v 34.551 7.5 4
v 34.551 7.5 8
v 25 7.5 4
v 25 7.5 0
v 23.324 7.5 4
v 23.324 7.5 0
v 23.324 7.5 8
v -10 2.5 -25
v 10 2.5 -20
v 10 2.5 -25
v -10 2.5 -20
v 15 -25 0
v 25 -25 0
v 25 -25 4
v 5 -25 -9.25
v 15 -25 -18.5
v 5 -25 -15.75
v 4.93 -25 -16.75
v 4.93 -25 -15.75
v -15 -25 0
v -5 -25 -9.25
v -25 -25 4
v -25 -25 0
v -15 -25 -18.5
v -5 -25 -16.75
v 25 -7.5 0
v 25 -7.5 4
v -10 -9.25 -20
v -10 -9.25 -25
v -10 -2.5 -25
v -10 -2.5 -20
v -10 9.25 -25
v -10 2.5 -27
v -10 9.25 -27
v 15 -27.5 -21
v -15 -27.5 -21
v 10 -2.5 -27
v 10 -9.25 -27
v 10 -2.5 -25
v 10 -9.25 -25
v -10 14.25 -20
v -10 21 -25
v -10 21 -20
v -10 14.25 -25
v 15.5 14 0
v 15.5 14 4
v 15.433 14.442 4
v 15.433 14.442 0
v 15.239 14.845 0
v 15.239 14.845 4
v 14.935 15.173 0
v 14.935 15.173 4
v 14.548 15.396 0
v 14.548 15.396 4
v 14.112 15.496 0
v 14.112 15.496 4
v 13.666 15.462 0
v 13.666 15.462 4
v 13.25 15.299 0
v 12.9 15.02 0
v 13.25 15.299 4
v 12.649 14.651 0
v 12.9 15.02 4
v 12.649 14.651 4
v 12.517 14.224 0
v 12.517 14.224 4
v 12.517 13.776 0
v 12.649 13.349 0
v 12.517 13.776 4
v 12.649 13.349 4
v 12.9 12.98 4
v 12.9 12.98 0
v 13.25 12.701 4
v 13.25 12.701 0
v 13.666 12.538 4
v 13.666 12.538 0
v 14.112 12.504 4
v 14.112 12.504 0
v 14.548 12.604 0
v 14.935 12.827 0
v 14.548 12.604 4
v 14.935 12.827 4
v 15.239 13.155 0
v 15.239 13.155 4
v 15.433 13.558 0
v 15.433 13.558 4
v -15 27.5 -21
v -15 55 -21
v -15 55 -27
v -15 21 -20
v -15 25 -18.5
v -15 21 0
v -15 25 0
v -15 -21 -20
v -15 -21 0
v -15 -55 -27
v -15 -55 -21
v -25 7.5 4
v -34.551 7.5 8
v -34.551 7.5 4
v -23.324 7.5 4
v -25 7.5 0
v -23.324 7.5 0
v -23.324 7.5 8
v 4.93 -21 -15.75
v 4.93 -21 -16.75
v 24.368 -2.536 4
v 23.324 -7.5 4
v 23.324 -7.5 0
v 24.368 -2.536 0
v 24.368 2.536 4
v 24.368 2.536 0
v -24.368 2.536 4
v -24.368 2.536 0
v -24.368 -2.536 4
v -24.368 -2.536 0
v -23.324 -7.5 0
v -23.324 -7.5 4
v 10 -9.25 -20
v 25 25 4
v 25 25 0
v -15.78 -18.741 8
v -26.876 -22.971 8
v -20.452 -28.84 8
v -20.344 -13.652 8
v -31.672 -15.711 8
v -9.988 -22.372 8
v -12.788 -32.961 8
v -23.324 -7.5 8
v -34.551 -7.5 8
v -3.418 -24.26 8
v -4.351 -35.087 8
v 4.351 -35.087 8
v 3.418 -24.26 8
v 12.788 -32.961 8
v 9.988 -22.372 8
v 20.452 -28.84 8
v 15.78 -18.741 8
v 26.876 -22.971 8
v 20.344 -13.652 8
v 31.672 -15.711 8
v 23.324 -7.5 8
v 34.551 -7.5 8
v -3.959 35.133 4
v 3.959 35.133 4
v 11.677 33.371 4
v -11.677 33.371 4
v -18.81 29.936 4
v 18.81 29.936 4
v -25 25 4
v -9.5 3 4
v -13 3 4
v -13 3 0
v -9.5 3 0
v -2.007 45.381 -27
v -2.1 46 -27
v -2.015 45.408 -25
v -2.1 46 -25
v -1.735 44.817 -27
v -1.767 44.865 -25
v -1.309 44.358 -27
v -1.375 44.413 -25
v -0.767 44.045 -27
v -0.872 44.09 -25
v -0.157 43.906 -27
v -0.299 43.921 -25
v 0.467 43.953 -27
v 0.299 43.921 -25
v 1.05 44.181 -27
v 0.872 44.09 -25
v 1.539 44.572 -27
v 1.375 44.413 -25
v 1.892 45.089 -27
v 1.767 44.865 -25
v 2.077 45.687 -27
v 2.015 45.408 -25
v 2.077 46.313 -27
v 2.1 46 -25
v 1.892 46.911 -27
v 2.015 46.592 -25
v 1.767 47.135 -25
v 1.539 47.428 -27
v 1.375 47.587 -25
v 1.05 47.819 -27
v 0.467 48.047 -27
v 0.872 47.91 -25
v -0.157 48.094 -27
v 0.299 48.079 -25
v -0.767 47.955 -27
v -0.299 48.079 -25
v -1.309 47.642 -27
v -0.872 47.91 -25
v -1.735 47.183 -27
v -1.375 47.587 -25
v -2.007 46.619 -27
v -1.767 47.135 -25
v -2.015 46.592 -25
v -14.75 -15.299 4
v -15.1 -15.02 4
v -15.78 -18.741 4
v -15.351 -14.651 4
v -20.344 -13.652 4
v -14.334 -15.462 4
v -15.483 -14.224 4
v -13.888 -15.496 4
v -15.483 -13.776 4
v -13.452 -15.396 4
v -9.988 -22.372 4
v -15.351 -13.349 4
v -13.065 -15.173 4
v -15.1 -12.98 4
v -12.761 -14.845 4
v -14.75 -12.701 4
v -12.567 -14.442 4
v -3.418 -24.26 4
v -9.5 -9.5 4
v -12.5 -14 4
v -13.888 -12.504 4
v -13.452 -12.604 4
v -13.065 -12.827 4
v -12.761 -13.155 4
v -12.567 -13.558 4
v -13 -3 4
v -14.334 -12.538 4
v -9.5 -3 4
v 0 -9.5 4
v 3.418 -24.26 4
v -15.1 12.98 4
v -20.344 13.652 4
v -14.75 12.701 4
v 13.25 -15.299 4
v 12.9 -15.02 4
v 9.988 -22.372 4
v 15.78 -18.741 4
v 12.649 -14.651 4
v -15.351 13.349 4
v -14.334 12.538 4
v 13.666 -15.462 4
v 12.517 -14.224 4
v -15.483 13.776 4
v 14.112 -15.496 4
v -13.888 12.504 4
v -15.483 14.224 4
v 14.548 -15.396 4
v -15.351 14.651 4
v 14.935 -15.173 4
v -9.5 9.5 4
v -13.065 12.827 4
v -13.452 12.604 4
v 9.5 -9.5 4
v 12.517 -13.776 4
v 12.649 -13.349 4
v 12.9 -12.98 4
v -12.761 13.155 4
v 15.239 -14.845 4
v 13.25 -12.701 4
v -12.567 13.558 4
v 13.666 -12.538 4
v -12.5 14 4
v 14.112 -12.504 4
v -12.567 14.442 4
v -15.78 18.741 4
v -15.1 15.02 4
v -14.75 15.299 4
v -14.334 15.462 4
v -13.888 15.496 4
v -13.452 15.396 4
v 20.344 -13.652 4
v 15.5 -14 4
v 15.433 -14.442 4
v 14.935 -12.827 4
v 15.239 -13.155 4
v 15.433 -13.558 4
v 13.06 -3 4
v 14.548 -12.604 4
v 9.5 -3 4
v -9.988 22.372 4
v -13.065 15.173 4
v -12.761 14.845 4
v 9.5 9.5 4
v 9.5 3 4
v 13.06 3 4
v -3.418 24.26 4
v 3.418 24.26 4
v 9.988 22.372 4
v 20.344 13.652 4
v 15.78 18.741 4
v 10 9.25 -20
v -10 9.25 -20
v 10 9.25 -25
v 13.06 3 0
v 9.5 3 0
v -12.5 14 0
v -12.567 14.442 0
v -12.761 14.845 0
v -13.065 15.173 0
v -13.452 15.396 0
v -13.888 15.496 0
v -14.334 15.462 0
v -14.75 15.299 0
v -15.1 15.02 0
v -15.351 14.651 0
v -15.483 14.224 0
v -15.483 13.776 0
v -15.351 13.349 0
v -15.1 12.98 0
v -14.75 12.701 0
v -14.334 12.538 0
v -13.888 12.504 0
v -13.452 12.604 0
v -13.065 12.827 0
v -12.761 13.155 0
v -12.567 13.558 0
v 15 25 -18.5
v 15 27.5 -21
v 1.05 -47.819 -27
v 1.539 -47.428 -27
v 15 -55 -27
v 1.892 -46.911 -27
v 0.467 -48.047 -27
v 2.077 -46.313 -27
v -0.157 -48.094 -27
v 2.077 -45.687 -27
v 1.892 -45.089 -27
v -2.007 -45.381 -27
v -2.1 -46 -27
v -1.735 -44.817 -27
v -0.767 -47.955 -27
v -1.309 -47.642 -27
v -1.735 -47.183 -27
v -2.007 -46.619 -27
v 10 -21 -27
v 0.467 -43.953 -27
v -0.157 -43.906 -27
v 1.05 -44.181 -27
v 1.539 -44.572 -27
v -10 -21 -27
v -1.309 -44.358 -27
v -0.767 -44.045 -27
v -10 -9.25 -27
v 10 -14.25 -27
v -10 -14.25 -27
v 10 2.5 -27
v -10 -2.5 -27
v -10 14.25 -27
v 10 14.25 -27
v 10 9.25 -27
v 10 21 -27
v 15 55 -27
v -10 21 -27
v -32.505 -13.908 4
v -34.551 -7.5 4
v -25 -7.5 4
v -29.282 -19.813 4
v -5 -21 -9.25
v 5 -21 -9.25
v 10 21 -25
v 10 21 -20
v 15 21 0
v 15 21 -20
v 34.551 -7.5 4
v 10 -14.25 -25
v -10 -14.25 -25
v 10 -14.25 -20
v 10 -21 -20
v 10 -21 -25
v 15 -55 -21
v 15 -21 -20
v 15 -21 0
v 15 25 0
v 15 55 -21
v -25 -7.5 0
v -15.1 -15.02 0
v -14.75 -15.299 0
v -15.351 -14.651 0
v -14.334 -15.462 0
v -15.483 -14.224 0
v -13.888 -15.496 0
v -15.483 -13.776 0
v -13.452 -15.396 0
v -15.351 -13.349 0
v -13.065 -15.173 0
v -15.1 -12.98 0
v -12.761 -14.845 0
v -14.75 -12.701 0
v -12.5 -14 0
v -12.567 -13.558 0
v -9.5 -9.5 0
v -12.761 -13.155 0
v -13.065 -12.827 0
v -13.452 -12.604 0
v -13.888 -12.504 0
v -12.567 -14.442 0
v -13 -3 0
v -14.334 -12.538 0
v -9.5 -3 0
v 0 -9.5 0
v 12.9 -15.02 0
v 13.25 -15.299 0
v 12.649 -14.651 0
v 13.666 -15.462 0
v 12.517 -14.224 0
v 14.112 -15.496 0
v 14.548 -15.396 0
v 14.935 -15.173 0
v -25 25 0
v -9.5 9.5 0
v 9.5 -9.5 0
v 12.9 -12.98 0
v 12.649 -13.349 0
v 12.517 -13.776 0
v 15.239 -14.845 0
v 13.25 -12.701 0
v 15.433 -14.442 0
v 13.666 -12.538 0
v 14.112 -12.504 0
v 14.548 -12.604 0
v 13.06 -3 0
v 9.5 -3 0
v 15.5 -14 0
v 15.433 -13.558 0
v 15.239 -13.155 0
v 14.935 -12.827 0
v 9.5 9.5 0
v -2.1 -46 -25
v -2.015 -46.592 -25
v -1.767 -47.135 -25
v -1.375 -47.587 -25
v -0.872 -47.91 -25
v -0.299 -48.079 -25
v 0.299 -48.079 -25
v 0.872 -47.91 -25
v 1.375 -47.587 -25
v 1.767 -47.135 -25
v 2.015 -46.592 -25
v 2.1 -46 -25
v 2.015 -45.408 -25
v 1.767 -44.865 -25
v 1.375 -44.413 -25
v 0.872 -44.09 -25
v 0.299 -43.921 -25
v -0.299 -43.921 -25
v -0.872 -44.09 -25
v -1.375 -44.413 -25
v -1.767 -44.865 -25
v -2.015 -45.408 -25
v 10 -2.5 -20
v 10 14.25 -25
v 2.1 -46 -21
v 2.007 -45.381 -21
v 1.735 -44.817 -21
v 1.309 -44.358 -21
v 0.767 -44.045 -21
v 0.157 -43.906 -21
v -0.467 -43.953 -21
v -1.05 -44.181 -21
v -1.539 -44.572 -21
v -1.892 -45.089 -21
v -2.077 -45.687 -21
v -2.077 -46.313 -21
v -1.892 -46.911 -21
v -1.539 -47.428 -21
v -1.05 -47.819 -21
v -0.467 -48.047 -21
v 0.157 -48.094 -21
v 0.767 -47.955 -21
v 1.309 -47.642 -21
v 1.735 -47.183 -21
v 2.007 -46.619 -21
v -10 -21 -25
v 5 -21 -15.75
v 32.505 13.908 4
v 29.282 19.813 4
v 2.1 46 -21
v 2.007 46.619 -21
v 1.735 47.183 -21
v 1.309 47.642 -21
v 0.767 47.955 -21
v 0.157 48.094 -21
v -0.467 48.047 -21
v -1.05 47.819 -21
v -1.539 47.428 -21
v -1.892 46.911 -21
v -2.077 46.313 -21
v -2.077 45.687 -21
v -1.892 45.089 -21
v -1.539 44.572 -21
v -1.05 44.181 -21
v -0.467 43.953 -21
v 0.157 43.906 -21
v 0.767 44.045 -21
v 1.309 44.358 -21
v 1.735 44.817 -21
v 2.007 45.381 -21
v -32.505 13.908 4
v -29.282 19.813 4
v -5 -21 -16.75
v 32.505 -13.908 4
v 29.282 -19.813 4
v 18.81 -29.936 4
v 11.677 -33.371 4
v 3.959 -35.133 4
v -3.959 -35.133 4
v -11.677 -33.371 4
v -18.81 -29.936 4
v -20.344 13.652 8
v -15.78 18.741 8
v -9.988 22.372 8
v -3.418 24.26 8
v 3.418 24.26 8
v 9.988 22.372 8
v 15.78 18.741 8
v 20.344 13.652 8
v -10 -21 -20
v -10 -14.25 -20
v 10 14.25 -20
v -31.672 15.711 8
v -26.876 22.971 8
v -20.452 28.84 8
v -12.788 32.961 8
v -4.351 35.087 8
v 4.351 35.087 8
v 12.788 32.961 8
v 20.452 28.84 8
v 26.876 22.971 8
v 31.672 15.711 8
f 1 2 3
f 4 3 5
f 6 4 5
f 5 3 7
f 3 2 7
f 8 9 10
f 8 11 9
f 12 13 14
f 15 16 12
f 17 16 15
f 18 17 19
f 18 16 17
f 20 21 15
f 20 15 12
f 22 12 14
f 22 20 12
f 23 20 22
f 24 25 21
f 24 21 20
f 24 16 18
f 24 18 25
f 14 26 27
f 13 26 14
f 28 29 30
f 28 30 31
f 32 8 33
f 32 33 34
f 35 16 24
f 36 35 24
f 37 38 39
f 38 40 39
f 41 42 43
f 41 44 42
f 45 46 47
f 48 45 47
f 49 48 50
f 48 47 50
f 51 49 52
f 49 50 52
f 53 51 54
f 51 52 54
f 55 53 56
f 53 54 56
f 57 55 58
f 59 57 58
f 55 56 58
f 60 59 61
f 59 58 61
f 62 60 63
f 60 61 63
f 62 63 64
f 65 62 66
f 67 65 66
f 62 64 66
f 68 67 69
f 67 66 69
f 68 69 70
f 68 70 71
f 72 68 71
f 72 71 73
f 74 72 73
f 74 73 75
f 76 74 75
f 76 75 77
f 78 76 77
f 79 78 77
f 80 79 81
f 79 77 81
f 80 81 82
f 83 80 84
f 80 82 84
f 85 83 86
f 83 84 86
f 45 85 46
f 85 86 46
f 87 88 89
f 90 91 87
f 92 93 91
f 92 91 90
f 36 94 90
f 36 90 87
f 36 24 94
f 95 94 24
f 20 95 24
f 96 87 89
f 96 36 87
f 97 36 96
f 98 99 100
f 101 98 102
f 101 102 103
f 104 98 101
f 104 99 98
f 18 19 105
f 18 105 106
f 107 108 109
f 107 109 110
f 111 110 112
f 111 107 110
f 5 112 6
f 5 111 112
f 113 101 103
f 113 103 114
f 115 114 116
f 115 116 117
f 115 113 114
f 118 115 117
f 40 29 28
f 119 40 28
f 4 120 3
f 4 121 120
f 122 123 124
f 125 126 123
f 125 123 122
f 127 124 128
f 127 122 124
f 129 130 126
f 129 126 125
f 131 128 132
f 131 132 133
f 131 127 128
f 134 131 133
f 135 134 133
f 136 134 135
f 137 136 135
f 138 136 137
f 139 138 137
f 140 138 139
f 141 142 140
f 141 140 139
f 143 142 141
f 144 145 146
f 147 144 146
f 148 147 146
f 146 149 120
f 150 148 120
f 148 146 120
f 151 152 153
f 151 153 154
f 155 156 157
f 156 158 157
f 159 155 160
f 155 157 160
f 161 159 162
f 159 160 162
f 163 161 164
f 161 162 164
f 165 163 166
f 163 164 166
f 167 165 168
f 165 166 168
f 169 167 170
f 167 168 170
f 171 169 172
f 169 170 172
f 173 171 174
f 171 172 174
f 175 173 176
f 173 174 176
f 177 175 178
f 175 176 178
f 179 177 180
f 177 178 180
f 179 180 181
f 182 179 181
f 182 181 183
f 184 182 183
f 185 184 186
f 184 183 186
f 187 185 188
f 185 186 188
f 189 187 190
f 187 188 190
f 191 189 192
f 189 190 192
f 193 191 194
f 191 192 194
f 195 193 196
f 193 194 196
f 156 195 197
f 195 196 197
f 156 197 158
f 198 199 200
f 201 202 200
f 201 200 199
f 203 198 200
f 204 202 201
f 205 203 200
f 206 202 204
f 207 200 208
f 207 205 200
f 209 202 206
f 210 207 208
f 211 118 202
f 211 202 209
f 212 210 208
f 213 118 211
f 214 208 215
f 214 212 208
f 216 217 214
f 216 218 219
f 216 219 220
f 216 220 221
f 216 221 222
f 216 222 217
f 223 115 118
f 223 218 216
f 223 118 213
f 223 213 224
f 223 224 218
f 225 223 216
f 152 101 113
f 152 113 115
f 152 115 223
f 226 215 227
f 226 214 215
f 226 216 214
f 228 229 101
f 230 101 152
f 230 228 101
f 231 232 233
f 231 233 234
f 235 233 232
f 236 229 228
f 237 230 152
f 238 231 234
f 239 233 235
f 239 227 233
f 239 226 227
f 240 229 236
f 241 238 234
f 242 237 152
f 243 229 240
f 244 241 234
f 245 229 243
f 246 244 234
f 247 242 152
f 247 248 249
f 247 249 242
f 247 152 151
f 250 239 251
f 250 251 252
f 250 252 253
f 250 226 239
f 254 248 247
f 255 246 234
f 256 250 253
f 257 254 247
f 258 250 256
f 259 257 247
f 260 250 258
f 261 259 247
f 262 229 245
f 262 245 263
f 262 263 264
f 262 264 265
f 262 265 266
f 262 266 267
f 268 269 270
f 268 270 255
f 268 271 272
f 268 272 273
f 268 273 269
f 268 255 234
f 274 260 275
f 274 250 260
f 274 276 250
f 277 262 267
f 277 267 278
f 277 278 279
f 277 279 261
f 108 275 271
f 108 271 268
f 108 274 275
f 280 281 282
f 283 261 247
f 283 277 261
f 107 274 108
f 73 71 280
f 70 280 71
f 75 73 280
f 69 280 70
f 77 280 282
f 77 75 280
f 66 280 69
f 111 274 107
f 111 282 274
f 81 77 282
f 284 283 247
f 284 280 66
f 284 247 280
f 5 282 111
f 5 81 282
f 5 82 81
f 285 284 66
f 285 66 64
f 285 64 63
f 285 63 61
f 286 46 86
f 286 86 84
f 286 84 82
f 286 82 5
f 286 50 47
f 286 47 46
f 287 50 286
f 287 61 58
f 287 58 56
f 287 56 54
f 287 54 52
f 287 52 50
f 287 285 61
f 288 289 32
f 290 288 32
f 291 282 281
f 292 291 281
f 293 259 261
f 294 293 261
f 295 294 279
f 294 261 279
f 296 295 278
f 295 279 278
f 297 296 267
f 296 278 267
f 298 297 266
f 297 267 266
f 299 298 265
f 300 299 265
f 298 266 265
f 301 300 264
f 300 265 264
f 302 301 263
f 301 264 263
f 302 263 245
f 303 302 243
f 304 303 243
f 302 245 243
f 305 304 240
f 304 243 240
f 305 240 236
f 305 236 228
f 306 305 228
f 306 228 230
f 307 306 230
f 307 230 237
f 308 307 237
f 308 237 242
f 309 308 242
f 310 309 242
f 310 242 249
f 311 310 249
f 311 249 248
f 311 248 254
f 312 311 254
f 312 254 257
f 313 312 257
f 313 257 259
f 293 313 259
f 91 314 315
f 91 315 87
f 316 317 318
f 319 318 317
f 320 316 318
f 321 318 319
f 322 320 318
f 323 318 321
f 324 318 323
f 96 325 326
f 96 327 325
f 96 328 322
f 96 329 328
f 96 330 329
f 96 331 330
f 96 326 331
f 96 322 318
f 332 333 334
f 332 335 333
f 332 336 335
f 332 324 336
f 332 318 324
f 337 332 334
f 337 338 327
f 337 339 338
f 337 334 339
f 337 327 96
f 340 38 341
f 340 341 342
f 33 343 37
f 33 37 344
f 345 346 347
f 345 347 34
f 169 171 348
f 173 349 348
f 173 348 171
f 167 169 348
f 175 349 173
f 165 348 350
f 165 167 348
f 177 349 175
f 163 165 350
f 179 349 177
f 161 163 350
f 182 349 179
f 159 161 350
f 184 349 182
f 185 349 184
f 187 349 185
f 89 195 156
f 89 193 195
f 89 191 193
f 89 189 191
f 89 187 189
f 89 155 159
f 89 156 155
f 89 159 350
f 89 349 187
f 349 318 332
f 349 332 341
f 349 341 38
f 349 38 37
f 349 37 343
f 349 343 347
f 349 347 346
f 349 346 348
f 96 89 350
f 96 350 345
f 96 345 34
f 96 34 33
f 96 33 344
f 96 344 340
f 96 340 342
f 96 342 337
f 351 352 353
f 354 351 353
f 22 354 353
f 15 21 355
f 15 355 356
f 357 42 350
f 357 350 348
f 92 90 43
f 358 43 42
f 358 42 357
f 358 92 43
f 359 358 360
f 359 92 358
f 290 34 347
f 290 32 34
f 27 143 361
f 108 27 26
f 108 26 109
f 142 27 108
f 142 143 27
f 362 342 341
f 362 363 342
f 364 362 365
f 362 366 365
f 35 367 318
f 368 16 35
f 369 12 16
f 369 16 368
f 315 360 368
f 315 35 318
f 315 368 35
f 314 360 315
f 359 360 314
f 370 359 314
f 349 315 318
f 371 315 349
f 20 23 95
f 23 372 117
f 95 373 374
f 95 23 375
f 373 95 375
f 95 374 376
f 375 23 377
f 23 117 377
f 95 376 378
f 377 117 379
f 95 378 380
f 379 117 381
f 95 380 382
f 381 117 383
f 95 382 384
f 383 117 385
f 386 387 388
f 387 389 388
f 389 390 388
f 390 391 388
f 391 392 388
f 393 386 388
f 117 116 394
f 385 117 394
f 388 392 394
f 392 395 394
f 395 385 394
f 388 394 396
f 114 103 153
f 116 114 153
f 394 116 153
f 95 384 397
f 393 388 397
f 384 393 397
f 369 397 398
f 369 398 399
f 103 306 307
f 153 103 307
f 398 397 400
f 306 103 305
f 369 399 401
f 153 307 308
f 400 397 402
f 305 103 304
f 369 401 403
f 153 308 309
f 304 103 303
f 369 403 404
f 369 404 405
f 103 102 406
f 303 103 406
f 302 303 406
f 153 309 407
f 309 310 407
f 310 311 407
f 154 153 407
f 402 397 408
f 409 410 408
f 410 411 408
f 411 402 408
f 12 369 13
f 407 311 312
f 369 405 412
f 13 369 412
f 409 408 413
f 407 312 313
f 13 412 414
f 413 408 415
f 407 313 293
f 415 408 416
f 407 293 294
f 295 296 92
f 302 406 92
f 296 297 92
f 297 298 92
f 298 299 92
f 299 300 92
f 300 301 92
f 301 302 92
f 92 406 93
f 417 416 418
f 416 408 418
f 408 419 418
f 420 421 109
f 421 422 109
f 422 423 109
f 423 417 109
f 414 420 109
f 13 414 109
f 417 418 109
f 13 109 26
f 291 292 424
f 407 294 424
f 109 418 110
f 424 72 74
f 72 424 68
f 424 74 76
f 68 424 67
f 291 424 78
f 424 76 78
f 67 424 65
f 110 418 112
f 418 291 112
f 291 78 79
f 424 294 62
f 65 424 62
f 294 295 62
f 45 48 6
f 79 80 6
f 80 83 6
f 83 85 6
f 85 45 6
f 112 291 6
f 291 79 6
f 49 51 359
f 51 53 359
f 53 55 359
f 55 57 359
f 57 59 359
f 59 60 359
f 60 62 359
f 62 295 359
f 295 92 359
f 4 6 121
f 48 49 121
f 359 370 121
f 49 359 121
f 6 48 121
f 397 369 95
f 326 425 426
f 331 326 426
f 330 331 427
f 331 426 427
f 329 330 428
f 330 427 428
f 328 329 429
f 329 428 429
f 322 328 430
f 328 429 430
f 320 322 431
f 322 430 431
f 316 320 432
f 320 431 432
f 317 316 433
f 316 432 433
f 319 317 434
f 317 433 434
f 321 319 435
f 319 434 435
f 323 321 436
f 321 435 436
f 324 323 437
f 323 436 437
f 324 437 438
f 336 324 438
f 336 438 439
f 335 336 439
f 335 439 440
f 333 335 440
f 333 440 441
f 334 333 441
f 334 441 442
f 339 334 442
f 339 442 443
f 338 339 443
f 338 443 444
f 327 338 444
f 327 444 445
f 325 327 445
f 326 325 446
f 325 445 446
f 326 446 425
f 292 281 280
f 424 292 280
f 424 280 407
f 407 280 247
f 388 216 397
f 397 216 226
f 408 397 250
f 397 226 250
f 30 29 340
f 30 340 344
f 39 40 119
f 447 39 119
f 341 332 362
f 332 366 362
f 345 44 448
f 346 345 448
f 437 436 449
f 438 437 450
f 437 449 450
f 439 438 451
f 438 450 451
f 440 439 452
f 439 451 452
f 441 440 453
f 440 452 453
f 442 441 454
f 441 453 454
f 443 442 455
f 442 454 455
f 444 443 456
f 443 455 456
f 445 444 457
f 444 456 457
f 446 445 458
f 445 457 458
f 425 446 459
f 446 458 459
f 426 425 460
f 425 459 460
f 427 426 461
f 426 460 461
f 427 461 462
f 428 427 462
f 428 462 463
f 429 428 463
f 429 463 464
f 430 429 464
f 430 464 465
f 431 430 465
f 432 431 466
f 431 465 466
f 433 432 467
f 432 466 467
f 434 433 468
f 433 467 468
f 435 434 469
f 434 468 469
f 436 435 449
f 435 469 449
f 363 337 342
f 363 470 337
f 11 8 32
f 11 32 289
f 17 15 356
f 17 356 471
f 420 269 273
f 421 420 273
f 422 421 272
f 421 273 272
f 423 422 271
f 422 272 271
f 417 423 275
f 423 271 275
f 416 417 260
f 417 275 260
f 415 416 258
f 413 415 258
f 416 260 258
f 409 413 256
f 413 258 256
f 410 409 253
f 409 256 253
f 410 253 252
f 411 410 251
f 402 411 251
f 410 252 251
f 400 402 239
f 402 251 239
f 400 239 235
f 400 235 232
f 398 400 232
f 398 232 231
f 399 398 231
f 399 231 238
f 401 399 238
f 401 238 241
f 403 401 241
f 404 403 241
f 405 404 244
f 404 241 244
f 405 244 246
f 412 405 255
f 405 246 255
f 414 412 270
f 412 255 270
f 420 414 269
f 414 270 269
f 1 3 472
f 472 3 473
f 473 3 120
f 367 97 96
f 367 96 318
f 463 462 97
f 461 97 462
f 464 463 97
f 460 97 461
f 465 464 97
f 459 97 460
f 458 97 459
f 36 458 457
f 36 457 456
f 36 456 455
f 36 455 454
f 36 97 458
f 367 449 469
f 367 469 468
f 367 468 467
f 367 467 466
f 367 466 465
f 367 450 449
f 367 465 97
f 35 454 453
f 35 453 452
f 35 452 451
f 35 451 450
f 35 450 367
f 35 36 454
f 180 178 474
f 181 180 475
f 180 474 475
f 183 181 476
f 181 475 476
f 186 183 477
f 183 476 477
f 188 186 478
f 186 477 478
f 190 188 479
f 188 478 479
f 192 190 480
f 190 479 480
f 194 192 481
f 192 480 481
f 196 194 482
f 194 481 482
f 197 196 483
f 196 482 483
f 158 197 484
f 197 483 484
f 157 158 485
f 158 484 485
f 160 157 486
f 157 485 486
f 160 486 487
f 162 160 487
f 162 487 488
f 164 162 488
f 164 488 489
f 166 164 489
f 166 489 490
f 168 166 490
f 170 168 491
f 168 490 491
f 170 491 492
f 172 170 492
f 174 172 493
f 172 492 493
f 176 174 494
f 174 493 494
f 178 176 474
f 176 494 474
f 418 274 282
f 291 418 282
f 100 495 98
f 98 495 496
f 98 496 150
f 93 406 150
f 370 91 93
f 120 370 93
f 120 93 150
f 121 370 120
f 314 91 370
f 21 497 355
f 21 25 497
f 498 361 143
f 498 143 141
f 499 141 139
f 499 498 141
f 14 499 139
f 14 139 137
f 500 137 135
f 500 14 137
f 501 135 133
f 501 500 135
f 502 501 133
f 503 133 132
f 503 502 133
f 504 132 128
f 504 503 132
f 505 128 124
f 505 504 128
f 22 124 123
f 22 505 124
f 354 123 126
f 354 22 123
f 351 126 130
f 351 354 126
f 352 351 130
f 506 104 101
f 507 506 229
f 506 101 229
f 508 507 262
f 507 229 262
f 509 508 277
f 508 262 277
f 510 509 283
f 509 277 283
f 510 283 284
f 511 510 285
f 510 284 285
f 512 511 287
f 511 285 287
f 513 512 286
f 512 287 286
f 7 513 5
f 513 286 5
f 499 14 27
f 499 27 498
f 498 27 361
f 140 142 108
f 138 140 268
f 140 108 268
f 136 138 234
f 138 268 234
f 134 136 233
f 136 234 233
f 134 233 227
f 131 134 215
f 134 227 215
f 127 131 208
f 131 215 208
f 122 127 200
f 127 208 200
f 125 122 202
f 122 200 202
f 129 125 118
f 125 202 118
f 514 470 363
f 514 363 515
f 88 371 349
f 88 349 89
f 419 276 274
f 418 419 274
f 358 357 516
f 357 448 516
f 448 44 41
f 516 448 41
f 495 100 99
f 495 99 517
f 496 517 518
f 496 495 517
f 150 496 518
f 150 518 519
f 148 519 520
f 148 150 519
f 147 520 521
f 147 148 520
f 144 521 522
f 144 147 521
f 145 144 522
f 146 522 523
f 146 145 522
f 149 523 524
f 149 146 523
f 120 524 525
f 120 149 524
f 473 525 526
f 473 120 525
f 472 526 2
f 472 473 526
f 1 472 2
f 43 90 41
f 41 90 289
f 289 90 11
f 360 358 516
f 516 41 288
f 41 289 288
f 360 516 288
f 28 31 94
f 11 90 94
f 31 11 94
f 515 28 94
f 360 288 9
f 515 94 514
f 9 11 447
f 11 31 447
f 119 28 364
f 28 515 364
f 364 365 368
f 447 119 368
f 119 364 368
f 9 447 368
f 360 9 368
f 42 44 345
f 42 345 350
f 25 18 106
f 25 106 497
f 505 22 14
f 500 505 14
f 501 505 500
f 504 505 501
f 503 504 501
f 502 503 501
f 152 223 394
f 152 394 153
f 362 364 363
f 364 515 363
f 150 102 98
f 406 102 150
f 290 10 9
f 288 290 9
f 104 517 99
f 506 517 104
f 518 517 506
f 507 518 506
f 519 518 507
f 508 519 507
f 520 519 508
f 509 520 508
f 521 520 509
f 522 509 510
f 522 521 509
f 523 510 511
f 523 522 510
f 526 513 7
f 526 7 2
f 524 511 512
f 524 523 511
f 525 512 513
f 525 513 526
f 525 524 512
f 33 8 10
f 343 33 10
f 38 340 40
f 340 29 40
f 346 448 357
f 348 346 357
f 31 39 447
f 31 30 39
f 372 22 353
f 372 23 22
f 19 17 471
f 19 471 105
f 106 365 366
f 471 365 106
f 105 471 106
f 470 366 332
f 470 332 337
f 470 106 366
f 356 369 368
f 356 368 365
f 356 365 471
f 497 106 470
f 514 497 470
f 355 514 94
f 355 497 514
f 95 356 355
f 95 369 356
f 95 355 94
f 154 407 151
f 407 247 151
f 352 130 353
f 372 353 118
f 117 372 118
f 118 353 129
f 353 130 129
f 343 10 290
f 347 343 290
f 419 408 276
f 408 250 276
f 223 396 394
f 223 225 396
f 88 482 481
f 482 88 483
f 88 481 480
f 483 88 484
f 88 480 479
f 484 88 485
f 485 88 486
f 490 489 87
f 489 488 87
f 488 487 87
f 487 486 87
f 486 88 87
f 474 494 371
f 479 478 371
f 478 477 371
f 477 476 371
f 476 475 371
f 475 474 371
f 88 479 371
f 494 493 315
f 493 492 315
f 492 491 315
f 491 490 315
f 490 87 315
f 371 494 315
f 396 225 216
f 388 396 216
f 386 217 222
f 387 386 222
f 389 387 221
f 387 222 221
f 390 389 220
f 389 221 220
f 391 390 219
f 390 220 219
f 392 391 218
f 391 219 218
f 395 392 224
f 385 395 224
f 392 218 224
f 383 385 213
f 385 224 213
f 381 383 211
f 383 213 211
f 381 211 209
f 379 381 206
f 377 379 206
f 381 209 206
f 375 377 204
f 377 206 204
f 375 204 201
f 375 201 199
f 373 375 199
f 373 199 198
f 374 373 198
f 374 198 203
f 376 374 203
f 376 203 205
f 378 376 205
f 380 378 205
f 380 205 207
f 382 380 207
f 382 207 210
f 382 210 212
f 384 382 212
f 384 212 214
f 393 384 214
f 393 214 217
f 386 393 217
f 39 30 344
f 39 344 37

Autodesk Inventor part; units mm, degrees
ref_plane "YZ Plane" through (0, 0, 0) normal (1, 0, 0) x (0, 1, 0)
ref_plane "XZ Plane" through (0, 0, 0) normal (0, 1, 0) x (-1, 0, 0)
ref_plane "XY Plane" through (0, 0, 0) normal (0, 0, 1) x (1, 0, 0)
ref_plane "Arbeitsebene2" through (0, 0, 0) normal (0, 0, 1) x (1, 0, 0)
ref_plane "Arbeitsebene1" through (0, 0, -5) normal (0, 0, 1) x (1, 0, 0)
sketch "Skizze2" plane through (0, 0, 0) normal (0, 0, 1) x (1, 0, 0)
  line L0 (13.6, 12.5) -> (15, 12.5) projected
  arc A0 (10.4, 12.5) -> (13.6, 12.5) centre (12, 12.5) ccw projected
  line L1 (-10.4, 12.5) -> (10.4, 12.5) projected
  arc A1 (-13.6, 12.5) -> (-10.4, 12.5) centre (-12, 12.5) ccw projected
  line L2 (-15, 12.5) -> (-13.6, 12.5) projected
  line L3 (-15, 12.5) -> (-15, -12.5) projected
  line L4 (-15, -12.5) -> (-13.6, -12.5) projected
  arc A2 (-10.4, -12.5) -> (-13.6, -12.5) centre (-12, -12.5) ccw projected
  line L5 (-10.4, -12.5) -> (10.4, -12.5) projected
  arc A3 (13.6, -12.5) -> (10.4, -12.5) centre (12, -12.5) ccw projected
  line L6 (13.6, -12.5) -> (15, -12.5) projected
  line L7 (15, 12.5) -> (15, -12.5) projected
  line L8 (-8.2, 2) -> (-9, 2) projected
  arc A4 (-8.2, 2) -> (-8, 2.2) centre (-8.2, 2.2) ccw projected
  line L9 (-8, 7.8) -> (-8, 2.2) projected
  arc A5 (-7.8, 8) -> (-8, 7.8) centre (-7.8, 7.8) ccw projected
  line L10 (7.8, 8) -> (-7.8, 8) projected
  arc A6 (8, 7.8) -> (7.8, 8) centre (7.8, 7.8) ccw projected
  line L11 (8, 2.2) -> (8, 7.8) projected
  arc A7 (8, 2.2) -> (8.2, 2) centre (8.2, 2.2) ccw projected
  line L12 (9, 2) -> (8.2, 2) projected
  arc A8 (9, -2) -> (9, 2) centre (9, 0) ccw projected
  line L13 (8.2, -2) -> (9, -2) projected
  arc A9 (8.2, -2) -> (8, -2.2) centre (8.2, -2.2) ccw projected
  line L14 (8, -7.8) -> (8, -2.2) projected
  arc A10 (7.8, -8) -> (8, -7.8) centre (7.8, -7.8) ccw projected
  line L15 (-7.8, -8) -> (7.8, -8) projected
  arc A11 (-8, -7.8) -> (-7.8, -8) centre (-7.8, -7.8) ccw projected
  line L16 (-8, -2.2) -> (-8, -7.8) projected
  arc A12 (-8, -2.2) -> (-8.2, -2) centre (-8.2, -2.2) ccw projected
  line L17 (-9, -2) -> (-8.2, -2) projected
  arc A13 (-9, 2) -> (-9, -2) centre (-9, 0) ccw projected
  line L18 (-25, 25) -> (25, 25)
  line L19 (25, 25) -> (25, -25)
  line L20 (25, -25) -> (-25, -25)
  line L21 (-25, -25) -> (-25, 25)
  line L22 (0, 0) -> (0, -14)
  line L23 (0, -14) -> (14, -14)
  line L24 (14, -14) -> (14, 14)
  line L25 (14, 14) -> (-14, 14)
  line L26 (-14, 14) -> (-14, -14)
  circle A14 centre (14, -14) radius 1.5
  circle A15 centre (-14, -14) radius 1.5
  circle A16 centre (-14, 14) radius 1.5
  circle A17 centre (14, 14) radius 1.5
  dimension "d62" = 14
  dimension "d63" = 14
  dimension "d64" = 28
  dimension "d65" = 28
  dimension "d66" = 28
  dimension "d67" = 3
  dimension "d68" = 3
  dimension "d69" = 3
  dimension "d70" = 3
extrude "Extrusion1" add sketch "Skizze2" along normal blind 4 contours A0 L1 A1 L2 A16 L25 A17 L0 | L0 L24 L6 A3 L5 A2 L4 L26 L2 A1 L1 A0 | A15 | L0 L7 L6 L24 | A17 L25 L24 | L24 L25 A17 | A14 L23 L22 L5 A3 L6 | A14 L23 L24 | L24 L23 A14 | A16 L26 L25 | L25 L26 A16 | L26 L4 L3 L2 | L18 L19 L20 L21
sketch "Skizze3" plane through (0, 0, 4) normal (0, 0, 1) x (1, 0, 0)
  circle A0 centre (0, 0) radius 35.3553
  circle A1 centre (0, 0) radius 24.5
  point P0 (0, 0)
  dimension "d3" = 49
extrude "Extrusion2" add sketch "Skizze3" along normal blind 4
sketch "Skizze4" plane through (0, 0, 0) normal (0, 0, -1) x (-1, 0, 0)
  circle A0 centre (0, 0) radius 35.3553 projected
  line L0 (25, 25) -> (25, -25) projected
  line L1 (-25, 25) -> (25, 25)
  line L2 (25, 25) -> (25, 21)
  line L3 (25, 21) -> (-25, 21)
  line L4 (-25, 21) -> (-25, 25)
  line L5 (-25, 25) -> (0, 25)
  line L6 (-25, 25) -> (25, 25) projected
  line L7 (0, 25) -> (15, 25)
  line L8 (15, 25) -> (-15, 25)
  line L9 (-15, 25) -> (-15, 21)
  line L10 (15, 25) -> (15, 21)
  line L11 (-15, 21) -> (15, 21)
  line L12 (-35.3553, 0) -> (35.3553, 0)
  line L13 (-15, -25) -> (-15, -21)
  line L14 (15, -25) -> (15, -21)
  line L15 (-15, -21) -> (15, -21)
  line L16 (15, -25) -> (-15, -25)
  line L17 (25, -25) -> (-25, -25) projected
  line L18 (15, 25) -> (-15, 25)
  point P0 (0, 0)
  dimension "d6" = 4
  dimension "d7" = 15
  dimension "d8" = 30
extrude "Extrusion3" add sketch "Skizze4" along normal blind 25 contours L10 L3 L9 L1 | L16 L13 L15 L14
sketch "Skizze5" plane through (-25, 25, 4) normal (0, 1, 0) x (1, 0, 0)
  line L0 (10, 29) -> (40, 29) projected
  line L1 (10, 4) -> (10, 29) projected
  line L2 (40, 29) -> (10, 29)
  line L3 (10, 29) -> (10, 25)
  line L4 (10, 25) -> (40, 25)
  line L5 (40, 25) -> (40, 29)
  line L6 (40, 29) -> (10, 29) projected
  line L7 (10, 4) -> (10, 29) projected
  point P0 (25, 4)
  dimension "d11" = 4
sketch "Skizze6" plane through (-25, -25, 4) normal (0, -1, 0) x (1, 0, 0)
  line L0 (10, -29) -> (40, -29) projected
  line L1 (10, -4) -> (10, -29) projected
  line L2 (40, -29) -> (10, -29)
  line L3 (10, -29) -> (10, -25)
  line L4 (10, -25) -> (40, -25)
  line L5 (40, -25) -> (40, -29)
  point P0 (25, -4)
  dimension "d12" = 4
extrude "Extrusion4" add sketch "Skizze6" along normal blind 30
extrude "Extrusion5" add sketch "Skizze5" along normal blind 30
sketch "Skizze7" plane through (-15, -21, 0) normal (0, 1, 0) x (1, 0, 0)
  line L0 (0, 25) -> (30, 25) projected
  line L1 (0, 0) -> (0, 25) projected
  line L2 (30, 0) -> (30, 25) projected
  line L3 (0, 25) -> (5, 25)
  line L4 (5, 25) -> (5, 20)
  line L5 (5, 20) -> (0, 20)
  line L6 (0, 20) -> (0, 25)
  line L7 (30, 25) -> (25, 25)
  line L8 (25, 25) -> (25, 20)
  line L9 (25, 20) -> (30, 20)
  line L10 (30, 20) -> (30, 25)
  point P0 (15, 0)
  point P1 (30, 20)
  point P2 (0, 20)
  point P3 (5, 25)
  dimension "d17" = 5
  dimension "d18" = 5
  dimension "d19" = 5
  dimension "d20" = 5
extrude "Extrusion6" add sketch "Skizze7" along normal blind 44
sketch "Skizze8" plane through (0, 0, 4) normal (0, 0, 1) x (1, 0, 0)
  line L0 (-9.5, 9.5) -> (-9.5, -9.5)
  line L1 (-9.5, -9.5) -> (9.5, -9.5)
  line L2 (9.5, -9.5) -> (9.5, 9.5)
  line L3 (9.5, 9.5) -> (-9.5, 9.5)
  line L4 (-9.5, 9.5) -> (-9.5, -9.5)
  line L5 (-5, -3) -> (-5, 3)
  line L6 (-5, -3) -> (-13, -3)
  line L7 (-13, -3) -> (-13, 3)
  line L8 (-13, 3) -> (-5, 3)
  line L9 (-5, 3) -> (-5, -3)
  line L10 (5.06, -3) -> (13.06, -3)
  line L11 (13.06, -3) -> (13.06, 3)
  line L12 (13.06, 3) -> (5.06, 3)
  line L13 (5.06, 3) -> (5.06, -3)
  point P0 (0, 0)
  point P1 (-9.5, -3)
  point P2 (9.5, -3)
  point P3 (9.5, 3)
  point P4 (-9.5, 3)
  dimension "d23" = 19
  dimension "d24" = 8
  dimension "d25" = 8
extrude "Extrusion7" cut sketch "Skizze8" against normal blind 15
chamfer "Fasen1" distance 2.5 angle 45 1 edges at (0, -25, -21)
chamfer "Fasen2" distance 2.5 angle 45 1 edges at (0, 25, -21)
sketch "Skizze11" plane through (-25, -25, 4) normal (0, -1, 0) x (1, 0, 0)
  line L0 (10, -4) -> (10, -22.5) projected
  line L1 (40, -22.5) -> (10, -22.5) projected
  line L2 (40, -4) -> (40, -22.5) projected
  line L3 (40, -4) -> (50, -4) projected
  line L4 (50, -4) -> (50, 0) projected
  line L5 (0, 0) -> (50, 0) projected
  line L6 (0, -4) -> (0, 0) projected
  line L7 (0, -4) -> (10, -4) projected
  line L8 (10, -4) -> (10, -22.5) projected
  line L9 (40, -22.5) -> (10, -22.5) projected
  line L10 (40, -4) -> (40, -22.5) projected
  line L11 (10, -22.5) -> (10, -25) projected
  line L12 (10, -22.5) -> (40, -22.5)
  line L13 (10, -22.5) -> (40, -22.5) projected
  line L14 (25, -22.5) -> (25, -19.5)
  line L15 (25, -19.5) -> (25, -16.5)
  line L16 (30, -19.75) -> (20, -19.75)
  line L17 (20, -19.75) -> (20, -13.25)
  line L18 (20, -13.25) -> (30, -13.25)
  line L19 (30, -13.25) -> (30, -19.75)
  line L20 (30, -19.75) -> (20, -13.25) construction
  line L21 (20, -19.75) -> (30, -13.25) construction
  point P0 (25, -4)
  point P1 (20.0696, -16.3928)
  dimension "d40" = 3
  dimension "d41" = 3
  dimension "d42" = 10
extrude "Extrusion10" cut sketch "Skizze11" against normal blind 8 contours L16 L17 L18 L19
sketch "Skizze12" plane through (-25, -25, 4) normal (0, -1, 0) x (1, 0, 0)
  line L0 (20, -13.25) -> (30, -13.25) projected
  line L1 (30, -13.25) -> (30, -19.75) projected
  line L2 (30, -19.75) -> (20, -19.75) projected
  line L3 (20, -19.75) -> (20, -13.25) projected
  line L4 (40, -22.5) -> (10, -22.5) projected
  line L5 (40, -4) -> (40, -22.5) projected
  line L6 (40, -4) -> (50, -4) projected
  line L7 (50, -4) -> (50, 0) projected
  line L8 (0, 0) -> (50, 0) projected
  line L9 (0, -4) -> (0, 0) projected
  line L10 (0, -4) -> (10, -4) projected
  line L11 (10, -4) -> (10, -22.5) projected
  line L12 (20.0696, -16.3928) -> (29.9304, -16.3928)
  line L13 (20, -19.75) -> (29.9304, -19.75)
  line L14 (29.9304, -19.75) -> (29.9304, -20.75)
  line L15 (29.9304, -20.75) -> (20, -20.75)
  line L16 (20, -20.75) -> (20, -19.75)
  point P0 (25, -4)
  dimension "d45" = 1
extrude "Extrusion11" cut sketch "Skizze12" against normal blind 7.25 contours L2 L14 L15 L16
sketch "Skizze13" plane through (0, 0, 8) normal (0, 0, 1) x (1, 0, 0)
  circle A0 centre (0, 0) radius 35.3553 projected
  circle A1 centre (0, 0) radius 24.5 projected
  circle A2 centre (0, 0) radius 24.5 projected
  line L0 (-24.5, 0) -> (-36.4173, 0)
  arc A3 (-25, 25) -> (-25, -25) centre (0, 0) ccw projected
  line L1 (-35.3553, 0) -> (-35.3553, 7.5)
  line L2 (-35.3553, 7.5) -> (-23.3238, 7.5)
  line L3 (-35.3553, 0) -> (-35.3553, -7.5)
  line L4 (-35.3553, -7.5) -> (-23.3238, -7.5)
  circle A4 centre (0, 0) radius 35.3553 projected
  line L5 (0, 35.3553) -> (0, -35.3553)
  line L6 (35.3553, 0) -> (35.3553, 7.5)
  line L7 (35.3553, 7.5) -> (23.3238, 7.5)
  line L8 (35.3553, 0) -> (35.3553, -7.5)
  line L9 (35.3553, -7.5) -> (23.3238, -7.5)
  point P0 (0, 0)
  point P1 (34.5507, -7.5)
  point P2 (34.5507, 7.5)
  point P3 (-34.5507, 7.5)
  point P4 (-34.5507, -7.5)
  dimension "d48" = 7.5
  dimension "d49" = 7.5
extrude "Extrusion12" cut sketch "Skizze13" against normal blind 47.75 contours A0 L9 A1 L7 | L2 A1 L0 A0 | L0 A1 L4 A0
sketch "Skizze14" plane through (-10, -21, -20) normal (1, 0, 0) x (0, 0, -1)
  line L0 (0, 42) -> (5, 42) projected
  line L1 (0, 0) -> (0, 42) projected
  line L2 (5, 0) -> (0, 0) projected
  line L3 (5, 0) -> (5, 42) projected
  line L4 (5, 42) -> (5, 21)
  line L5 (5, 21) -> (0, 21)
  line L6 (0, 0) -> (0, 42) projected
  line L7 (5, 21) -> (5, 18.5)
  line L8 (5, 0) -> (5, 42) projected
  line L9 (5, 18.5) -> (0, 18.5)
  line L10 (0, 18.5) -> (0, 23.5)
  line L11 (0, 23.5) -> (5, 23.5)
  line L12 (5, 23.5) -> (5, 18.5)
  point P0 (-20, 21)
  point P1 (0, 18.5)
  point P2 (5, 18.5)
  dimension "d52" = 2.5
  dimension "d53" = 5
extrude "Extrusion13" add sketch "Skizze14" along normal blind 21.25 contours L11 L3 L5 L1 | L5 L3 L9 L1
sketch "Skizze15" plane through (-15, -55, -21) normal (0, 0, 1) x (1, 0, 0)
  line L0 (0, 27.5) -> (30, 27.5) projected
  line L1 (0, 27.5) -> (0, 0) projected
  line L2 (30, 0) -> (0, 0) projected
  line L3 (30, 27.5) -> (30, 0) projected
  line L4 (30, 82.5) -> (0, 82.5) projected
  line L5 (30, 82.5) -> (30, 110) projected
  line L6 (0, 110) -> (30, 110) projected
  line L7 (0, 82.5) -> (0, 110) projected
  line L8 (15, 0) -> (15, 9)
  circle A0 centre (15, 9) radius 2.1
  line L9 (15, 110) -> (15, 101)
  circle A1 centre (15, 101) radius 2.1
  point P0 (15, 55)
  dimension "d56" = 9
  dimension "d57" = 4.2
  dimension "d58" = 9
  dimension "d59" = 4.2
extrude "Extrusion14" cut sketch "Skizze15" against normal blind 41.25 contours A0 | A1
sketch "Skizze16" plane through (0, 0, 4) normal (0, 0, 1) x (1, 0, 0)
  line L0 (0, 0) -> (0, -14)
  line L1 (0, -14) -> (14, -14)
  line L2 (14, -14) -> (-14, -14)
  line L3 (-14, -14) -> (-14, 14)
  line L4 (-14, 14) -> (14, 14)
  line L5 (14, 14) -> (14, -14)
  circle A0 centre (-14, -14) radius 1.5
  circle A1 centre (-14, 14) radius 1.5
  circle A2 centre (14, 14) radius 1.5
  circle A3 centre (14, -14) radius 1.5
  dimension "d71" = 14
  dimension "d72" = 14
  dimension "d73" = 28
  dimension "d74" = 28
  dimension "d75" = 3
  dimension "d76" = 3
  dimension "d77" = 3
  dimension "d78" = 3
extrude "Extrusion15" cut sketch "Skizze16" against normal blind 7.25 contours A3 L5 L1 | L1 L5 A3 | A0 L3 L2 | L2 L3 A0 | A2 L4 L5 | L5 L4 A2 | A1 L4 L3 | L3 L4 A1
sketch "Skizze17" plane through (-10, -21, -20) normal (1, 0, 0) x (0, 0, -1)
  point P0 (-20, 21)
sketch "Skizze18" plane through (-10, -21, -20) normal (1, 0, 0) x (0, 0, -1)
  line L0 (5, 18.5) -> (0, 18.5) projected
  line L1 (0, 0) -> (0, 18.5) projected
  line L2 (5, 0) -> (0, 0) projected
  line L3 (5, 0) -> (5, 18.5) projected
  line L4 (0, 23.5) -> (5, 23.5) projected
  line L5 (5, 23.5) -> (5, 42) projected
  line L6 (0, 42) -> (5, 42) projected
  line L7 (0, 23.5) -> (0, 42) projected
  line L8 (0, 0) -> (0, 9.25)
  line L9 (0, 0) -> (0, 18.5) projected
  line L10 (0, 0) -> (0, 42) projected
  line L11 (0, 32.75) -> (0, 30.25)
  line L12 (0, 9.25) -> (0, 6.75)
  line L13 (5, 42) -> (5, -34) projected
  line L14 (0, 6.75) -> (5, 6.75)
  line L15 (5, 6.75) -> (5, 11.75)
  line L16 (5, 11.75) -> (0, 11.75)
  line L17 (0, 11.75) -> (0, 6.75)
  line L18 (0, 30.25) -> (5, 30.25)
  line L19 (5, 30.25) -> (5, 35.25)
  line L20 (5, 35.25) -> (0, 35.25)
  line L21 (0, 35.25) -> (0, 30.25)
  point P0 (-20, 21)
  point P1 (0, 35.25)
  point P2 (0, 30.25)
  point P3 (0, 6.75)
  point P4 (5, 6.75)
  dimension "d81" = 2.5
  dimension "d82" = 2.5
  dimension "d83" = 5
  dimension "d84" = 5
extrude "Extrusion16" add sketch "Skizze18" along normal blind 23.25 contours L3 L14 L1 L16 | L18 L7 L20 L5
sketch "Skizze19" plane through (0, 0, -25) normal (0, 0, -1) x (-1, 0, 0)
  line L0 (10, 2.5) -> (10, 9.25) projected
  line L1 (10, 2.5) -> (-10, 2.5) projected
  line L2 (-10, 2.5) -> (-10, 9.25) projected
  line L3 (10, 9.25) -> (-10, 9.25) projected
  line L4 (10, -21) -> (10, -14.25) projected
  line L5 (10, -21) -> (-10, -21) projected
  line L6 (-10, -21) -> (-10, -14.25) projected
  line L7 (10, -14.25) -> (-10, -14.25) projected
  circle A0 centre (0, 46) radius 2.1 projected
  circle A1 centre (0, -46) radius 2.1 projected
  line L8 (10, -9.25) -> (-10, -9.25) projected
  line L9 (-10, -9.25) -> (-10, -2.5) projected
  line L10 (10, -2.5) -> (-10, -2.5) projected
  line L11 (10, -9.25) -> (10, -2.5) projected
  line L12 (10, 14.25) -> (-10, 14.25) projected
  line L13 (-10, 14.25) -> (-10, 21) projected
  line L14 (-10, 21) -> (10, 21) projected
  line L15 (10, 14.25) -> (10, 21) projected
  line L16 (-15, -55) -> (-15, 55) projected
  line L17 (15, -55) -> (-15, -55) projected
  line L18 (15, 21) -> (15, -55) projected
  line L19 (15, 21) -> (15, 55) projected
  line L20 (-15, 55) -> (15, 55) projected
  point P0 (0, 0)
extrude "Extrusion17" add sketch "Skizze19" along normal blind 2
properties part number "CAM1"
